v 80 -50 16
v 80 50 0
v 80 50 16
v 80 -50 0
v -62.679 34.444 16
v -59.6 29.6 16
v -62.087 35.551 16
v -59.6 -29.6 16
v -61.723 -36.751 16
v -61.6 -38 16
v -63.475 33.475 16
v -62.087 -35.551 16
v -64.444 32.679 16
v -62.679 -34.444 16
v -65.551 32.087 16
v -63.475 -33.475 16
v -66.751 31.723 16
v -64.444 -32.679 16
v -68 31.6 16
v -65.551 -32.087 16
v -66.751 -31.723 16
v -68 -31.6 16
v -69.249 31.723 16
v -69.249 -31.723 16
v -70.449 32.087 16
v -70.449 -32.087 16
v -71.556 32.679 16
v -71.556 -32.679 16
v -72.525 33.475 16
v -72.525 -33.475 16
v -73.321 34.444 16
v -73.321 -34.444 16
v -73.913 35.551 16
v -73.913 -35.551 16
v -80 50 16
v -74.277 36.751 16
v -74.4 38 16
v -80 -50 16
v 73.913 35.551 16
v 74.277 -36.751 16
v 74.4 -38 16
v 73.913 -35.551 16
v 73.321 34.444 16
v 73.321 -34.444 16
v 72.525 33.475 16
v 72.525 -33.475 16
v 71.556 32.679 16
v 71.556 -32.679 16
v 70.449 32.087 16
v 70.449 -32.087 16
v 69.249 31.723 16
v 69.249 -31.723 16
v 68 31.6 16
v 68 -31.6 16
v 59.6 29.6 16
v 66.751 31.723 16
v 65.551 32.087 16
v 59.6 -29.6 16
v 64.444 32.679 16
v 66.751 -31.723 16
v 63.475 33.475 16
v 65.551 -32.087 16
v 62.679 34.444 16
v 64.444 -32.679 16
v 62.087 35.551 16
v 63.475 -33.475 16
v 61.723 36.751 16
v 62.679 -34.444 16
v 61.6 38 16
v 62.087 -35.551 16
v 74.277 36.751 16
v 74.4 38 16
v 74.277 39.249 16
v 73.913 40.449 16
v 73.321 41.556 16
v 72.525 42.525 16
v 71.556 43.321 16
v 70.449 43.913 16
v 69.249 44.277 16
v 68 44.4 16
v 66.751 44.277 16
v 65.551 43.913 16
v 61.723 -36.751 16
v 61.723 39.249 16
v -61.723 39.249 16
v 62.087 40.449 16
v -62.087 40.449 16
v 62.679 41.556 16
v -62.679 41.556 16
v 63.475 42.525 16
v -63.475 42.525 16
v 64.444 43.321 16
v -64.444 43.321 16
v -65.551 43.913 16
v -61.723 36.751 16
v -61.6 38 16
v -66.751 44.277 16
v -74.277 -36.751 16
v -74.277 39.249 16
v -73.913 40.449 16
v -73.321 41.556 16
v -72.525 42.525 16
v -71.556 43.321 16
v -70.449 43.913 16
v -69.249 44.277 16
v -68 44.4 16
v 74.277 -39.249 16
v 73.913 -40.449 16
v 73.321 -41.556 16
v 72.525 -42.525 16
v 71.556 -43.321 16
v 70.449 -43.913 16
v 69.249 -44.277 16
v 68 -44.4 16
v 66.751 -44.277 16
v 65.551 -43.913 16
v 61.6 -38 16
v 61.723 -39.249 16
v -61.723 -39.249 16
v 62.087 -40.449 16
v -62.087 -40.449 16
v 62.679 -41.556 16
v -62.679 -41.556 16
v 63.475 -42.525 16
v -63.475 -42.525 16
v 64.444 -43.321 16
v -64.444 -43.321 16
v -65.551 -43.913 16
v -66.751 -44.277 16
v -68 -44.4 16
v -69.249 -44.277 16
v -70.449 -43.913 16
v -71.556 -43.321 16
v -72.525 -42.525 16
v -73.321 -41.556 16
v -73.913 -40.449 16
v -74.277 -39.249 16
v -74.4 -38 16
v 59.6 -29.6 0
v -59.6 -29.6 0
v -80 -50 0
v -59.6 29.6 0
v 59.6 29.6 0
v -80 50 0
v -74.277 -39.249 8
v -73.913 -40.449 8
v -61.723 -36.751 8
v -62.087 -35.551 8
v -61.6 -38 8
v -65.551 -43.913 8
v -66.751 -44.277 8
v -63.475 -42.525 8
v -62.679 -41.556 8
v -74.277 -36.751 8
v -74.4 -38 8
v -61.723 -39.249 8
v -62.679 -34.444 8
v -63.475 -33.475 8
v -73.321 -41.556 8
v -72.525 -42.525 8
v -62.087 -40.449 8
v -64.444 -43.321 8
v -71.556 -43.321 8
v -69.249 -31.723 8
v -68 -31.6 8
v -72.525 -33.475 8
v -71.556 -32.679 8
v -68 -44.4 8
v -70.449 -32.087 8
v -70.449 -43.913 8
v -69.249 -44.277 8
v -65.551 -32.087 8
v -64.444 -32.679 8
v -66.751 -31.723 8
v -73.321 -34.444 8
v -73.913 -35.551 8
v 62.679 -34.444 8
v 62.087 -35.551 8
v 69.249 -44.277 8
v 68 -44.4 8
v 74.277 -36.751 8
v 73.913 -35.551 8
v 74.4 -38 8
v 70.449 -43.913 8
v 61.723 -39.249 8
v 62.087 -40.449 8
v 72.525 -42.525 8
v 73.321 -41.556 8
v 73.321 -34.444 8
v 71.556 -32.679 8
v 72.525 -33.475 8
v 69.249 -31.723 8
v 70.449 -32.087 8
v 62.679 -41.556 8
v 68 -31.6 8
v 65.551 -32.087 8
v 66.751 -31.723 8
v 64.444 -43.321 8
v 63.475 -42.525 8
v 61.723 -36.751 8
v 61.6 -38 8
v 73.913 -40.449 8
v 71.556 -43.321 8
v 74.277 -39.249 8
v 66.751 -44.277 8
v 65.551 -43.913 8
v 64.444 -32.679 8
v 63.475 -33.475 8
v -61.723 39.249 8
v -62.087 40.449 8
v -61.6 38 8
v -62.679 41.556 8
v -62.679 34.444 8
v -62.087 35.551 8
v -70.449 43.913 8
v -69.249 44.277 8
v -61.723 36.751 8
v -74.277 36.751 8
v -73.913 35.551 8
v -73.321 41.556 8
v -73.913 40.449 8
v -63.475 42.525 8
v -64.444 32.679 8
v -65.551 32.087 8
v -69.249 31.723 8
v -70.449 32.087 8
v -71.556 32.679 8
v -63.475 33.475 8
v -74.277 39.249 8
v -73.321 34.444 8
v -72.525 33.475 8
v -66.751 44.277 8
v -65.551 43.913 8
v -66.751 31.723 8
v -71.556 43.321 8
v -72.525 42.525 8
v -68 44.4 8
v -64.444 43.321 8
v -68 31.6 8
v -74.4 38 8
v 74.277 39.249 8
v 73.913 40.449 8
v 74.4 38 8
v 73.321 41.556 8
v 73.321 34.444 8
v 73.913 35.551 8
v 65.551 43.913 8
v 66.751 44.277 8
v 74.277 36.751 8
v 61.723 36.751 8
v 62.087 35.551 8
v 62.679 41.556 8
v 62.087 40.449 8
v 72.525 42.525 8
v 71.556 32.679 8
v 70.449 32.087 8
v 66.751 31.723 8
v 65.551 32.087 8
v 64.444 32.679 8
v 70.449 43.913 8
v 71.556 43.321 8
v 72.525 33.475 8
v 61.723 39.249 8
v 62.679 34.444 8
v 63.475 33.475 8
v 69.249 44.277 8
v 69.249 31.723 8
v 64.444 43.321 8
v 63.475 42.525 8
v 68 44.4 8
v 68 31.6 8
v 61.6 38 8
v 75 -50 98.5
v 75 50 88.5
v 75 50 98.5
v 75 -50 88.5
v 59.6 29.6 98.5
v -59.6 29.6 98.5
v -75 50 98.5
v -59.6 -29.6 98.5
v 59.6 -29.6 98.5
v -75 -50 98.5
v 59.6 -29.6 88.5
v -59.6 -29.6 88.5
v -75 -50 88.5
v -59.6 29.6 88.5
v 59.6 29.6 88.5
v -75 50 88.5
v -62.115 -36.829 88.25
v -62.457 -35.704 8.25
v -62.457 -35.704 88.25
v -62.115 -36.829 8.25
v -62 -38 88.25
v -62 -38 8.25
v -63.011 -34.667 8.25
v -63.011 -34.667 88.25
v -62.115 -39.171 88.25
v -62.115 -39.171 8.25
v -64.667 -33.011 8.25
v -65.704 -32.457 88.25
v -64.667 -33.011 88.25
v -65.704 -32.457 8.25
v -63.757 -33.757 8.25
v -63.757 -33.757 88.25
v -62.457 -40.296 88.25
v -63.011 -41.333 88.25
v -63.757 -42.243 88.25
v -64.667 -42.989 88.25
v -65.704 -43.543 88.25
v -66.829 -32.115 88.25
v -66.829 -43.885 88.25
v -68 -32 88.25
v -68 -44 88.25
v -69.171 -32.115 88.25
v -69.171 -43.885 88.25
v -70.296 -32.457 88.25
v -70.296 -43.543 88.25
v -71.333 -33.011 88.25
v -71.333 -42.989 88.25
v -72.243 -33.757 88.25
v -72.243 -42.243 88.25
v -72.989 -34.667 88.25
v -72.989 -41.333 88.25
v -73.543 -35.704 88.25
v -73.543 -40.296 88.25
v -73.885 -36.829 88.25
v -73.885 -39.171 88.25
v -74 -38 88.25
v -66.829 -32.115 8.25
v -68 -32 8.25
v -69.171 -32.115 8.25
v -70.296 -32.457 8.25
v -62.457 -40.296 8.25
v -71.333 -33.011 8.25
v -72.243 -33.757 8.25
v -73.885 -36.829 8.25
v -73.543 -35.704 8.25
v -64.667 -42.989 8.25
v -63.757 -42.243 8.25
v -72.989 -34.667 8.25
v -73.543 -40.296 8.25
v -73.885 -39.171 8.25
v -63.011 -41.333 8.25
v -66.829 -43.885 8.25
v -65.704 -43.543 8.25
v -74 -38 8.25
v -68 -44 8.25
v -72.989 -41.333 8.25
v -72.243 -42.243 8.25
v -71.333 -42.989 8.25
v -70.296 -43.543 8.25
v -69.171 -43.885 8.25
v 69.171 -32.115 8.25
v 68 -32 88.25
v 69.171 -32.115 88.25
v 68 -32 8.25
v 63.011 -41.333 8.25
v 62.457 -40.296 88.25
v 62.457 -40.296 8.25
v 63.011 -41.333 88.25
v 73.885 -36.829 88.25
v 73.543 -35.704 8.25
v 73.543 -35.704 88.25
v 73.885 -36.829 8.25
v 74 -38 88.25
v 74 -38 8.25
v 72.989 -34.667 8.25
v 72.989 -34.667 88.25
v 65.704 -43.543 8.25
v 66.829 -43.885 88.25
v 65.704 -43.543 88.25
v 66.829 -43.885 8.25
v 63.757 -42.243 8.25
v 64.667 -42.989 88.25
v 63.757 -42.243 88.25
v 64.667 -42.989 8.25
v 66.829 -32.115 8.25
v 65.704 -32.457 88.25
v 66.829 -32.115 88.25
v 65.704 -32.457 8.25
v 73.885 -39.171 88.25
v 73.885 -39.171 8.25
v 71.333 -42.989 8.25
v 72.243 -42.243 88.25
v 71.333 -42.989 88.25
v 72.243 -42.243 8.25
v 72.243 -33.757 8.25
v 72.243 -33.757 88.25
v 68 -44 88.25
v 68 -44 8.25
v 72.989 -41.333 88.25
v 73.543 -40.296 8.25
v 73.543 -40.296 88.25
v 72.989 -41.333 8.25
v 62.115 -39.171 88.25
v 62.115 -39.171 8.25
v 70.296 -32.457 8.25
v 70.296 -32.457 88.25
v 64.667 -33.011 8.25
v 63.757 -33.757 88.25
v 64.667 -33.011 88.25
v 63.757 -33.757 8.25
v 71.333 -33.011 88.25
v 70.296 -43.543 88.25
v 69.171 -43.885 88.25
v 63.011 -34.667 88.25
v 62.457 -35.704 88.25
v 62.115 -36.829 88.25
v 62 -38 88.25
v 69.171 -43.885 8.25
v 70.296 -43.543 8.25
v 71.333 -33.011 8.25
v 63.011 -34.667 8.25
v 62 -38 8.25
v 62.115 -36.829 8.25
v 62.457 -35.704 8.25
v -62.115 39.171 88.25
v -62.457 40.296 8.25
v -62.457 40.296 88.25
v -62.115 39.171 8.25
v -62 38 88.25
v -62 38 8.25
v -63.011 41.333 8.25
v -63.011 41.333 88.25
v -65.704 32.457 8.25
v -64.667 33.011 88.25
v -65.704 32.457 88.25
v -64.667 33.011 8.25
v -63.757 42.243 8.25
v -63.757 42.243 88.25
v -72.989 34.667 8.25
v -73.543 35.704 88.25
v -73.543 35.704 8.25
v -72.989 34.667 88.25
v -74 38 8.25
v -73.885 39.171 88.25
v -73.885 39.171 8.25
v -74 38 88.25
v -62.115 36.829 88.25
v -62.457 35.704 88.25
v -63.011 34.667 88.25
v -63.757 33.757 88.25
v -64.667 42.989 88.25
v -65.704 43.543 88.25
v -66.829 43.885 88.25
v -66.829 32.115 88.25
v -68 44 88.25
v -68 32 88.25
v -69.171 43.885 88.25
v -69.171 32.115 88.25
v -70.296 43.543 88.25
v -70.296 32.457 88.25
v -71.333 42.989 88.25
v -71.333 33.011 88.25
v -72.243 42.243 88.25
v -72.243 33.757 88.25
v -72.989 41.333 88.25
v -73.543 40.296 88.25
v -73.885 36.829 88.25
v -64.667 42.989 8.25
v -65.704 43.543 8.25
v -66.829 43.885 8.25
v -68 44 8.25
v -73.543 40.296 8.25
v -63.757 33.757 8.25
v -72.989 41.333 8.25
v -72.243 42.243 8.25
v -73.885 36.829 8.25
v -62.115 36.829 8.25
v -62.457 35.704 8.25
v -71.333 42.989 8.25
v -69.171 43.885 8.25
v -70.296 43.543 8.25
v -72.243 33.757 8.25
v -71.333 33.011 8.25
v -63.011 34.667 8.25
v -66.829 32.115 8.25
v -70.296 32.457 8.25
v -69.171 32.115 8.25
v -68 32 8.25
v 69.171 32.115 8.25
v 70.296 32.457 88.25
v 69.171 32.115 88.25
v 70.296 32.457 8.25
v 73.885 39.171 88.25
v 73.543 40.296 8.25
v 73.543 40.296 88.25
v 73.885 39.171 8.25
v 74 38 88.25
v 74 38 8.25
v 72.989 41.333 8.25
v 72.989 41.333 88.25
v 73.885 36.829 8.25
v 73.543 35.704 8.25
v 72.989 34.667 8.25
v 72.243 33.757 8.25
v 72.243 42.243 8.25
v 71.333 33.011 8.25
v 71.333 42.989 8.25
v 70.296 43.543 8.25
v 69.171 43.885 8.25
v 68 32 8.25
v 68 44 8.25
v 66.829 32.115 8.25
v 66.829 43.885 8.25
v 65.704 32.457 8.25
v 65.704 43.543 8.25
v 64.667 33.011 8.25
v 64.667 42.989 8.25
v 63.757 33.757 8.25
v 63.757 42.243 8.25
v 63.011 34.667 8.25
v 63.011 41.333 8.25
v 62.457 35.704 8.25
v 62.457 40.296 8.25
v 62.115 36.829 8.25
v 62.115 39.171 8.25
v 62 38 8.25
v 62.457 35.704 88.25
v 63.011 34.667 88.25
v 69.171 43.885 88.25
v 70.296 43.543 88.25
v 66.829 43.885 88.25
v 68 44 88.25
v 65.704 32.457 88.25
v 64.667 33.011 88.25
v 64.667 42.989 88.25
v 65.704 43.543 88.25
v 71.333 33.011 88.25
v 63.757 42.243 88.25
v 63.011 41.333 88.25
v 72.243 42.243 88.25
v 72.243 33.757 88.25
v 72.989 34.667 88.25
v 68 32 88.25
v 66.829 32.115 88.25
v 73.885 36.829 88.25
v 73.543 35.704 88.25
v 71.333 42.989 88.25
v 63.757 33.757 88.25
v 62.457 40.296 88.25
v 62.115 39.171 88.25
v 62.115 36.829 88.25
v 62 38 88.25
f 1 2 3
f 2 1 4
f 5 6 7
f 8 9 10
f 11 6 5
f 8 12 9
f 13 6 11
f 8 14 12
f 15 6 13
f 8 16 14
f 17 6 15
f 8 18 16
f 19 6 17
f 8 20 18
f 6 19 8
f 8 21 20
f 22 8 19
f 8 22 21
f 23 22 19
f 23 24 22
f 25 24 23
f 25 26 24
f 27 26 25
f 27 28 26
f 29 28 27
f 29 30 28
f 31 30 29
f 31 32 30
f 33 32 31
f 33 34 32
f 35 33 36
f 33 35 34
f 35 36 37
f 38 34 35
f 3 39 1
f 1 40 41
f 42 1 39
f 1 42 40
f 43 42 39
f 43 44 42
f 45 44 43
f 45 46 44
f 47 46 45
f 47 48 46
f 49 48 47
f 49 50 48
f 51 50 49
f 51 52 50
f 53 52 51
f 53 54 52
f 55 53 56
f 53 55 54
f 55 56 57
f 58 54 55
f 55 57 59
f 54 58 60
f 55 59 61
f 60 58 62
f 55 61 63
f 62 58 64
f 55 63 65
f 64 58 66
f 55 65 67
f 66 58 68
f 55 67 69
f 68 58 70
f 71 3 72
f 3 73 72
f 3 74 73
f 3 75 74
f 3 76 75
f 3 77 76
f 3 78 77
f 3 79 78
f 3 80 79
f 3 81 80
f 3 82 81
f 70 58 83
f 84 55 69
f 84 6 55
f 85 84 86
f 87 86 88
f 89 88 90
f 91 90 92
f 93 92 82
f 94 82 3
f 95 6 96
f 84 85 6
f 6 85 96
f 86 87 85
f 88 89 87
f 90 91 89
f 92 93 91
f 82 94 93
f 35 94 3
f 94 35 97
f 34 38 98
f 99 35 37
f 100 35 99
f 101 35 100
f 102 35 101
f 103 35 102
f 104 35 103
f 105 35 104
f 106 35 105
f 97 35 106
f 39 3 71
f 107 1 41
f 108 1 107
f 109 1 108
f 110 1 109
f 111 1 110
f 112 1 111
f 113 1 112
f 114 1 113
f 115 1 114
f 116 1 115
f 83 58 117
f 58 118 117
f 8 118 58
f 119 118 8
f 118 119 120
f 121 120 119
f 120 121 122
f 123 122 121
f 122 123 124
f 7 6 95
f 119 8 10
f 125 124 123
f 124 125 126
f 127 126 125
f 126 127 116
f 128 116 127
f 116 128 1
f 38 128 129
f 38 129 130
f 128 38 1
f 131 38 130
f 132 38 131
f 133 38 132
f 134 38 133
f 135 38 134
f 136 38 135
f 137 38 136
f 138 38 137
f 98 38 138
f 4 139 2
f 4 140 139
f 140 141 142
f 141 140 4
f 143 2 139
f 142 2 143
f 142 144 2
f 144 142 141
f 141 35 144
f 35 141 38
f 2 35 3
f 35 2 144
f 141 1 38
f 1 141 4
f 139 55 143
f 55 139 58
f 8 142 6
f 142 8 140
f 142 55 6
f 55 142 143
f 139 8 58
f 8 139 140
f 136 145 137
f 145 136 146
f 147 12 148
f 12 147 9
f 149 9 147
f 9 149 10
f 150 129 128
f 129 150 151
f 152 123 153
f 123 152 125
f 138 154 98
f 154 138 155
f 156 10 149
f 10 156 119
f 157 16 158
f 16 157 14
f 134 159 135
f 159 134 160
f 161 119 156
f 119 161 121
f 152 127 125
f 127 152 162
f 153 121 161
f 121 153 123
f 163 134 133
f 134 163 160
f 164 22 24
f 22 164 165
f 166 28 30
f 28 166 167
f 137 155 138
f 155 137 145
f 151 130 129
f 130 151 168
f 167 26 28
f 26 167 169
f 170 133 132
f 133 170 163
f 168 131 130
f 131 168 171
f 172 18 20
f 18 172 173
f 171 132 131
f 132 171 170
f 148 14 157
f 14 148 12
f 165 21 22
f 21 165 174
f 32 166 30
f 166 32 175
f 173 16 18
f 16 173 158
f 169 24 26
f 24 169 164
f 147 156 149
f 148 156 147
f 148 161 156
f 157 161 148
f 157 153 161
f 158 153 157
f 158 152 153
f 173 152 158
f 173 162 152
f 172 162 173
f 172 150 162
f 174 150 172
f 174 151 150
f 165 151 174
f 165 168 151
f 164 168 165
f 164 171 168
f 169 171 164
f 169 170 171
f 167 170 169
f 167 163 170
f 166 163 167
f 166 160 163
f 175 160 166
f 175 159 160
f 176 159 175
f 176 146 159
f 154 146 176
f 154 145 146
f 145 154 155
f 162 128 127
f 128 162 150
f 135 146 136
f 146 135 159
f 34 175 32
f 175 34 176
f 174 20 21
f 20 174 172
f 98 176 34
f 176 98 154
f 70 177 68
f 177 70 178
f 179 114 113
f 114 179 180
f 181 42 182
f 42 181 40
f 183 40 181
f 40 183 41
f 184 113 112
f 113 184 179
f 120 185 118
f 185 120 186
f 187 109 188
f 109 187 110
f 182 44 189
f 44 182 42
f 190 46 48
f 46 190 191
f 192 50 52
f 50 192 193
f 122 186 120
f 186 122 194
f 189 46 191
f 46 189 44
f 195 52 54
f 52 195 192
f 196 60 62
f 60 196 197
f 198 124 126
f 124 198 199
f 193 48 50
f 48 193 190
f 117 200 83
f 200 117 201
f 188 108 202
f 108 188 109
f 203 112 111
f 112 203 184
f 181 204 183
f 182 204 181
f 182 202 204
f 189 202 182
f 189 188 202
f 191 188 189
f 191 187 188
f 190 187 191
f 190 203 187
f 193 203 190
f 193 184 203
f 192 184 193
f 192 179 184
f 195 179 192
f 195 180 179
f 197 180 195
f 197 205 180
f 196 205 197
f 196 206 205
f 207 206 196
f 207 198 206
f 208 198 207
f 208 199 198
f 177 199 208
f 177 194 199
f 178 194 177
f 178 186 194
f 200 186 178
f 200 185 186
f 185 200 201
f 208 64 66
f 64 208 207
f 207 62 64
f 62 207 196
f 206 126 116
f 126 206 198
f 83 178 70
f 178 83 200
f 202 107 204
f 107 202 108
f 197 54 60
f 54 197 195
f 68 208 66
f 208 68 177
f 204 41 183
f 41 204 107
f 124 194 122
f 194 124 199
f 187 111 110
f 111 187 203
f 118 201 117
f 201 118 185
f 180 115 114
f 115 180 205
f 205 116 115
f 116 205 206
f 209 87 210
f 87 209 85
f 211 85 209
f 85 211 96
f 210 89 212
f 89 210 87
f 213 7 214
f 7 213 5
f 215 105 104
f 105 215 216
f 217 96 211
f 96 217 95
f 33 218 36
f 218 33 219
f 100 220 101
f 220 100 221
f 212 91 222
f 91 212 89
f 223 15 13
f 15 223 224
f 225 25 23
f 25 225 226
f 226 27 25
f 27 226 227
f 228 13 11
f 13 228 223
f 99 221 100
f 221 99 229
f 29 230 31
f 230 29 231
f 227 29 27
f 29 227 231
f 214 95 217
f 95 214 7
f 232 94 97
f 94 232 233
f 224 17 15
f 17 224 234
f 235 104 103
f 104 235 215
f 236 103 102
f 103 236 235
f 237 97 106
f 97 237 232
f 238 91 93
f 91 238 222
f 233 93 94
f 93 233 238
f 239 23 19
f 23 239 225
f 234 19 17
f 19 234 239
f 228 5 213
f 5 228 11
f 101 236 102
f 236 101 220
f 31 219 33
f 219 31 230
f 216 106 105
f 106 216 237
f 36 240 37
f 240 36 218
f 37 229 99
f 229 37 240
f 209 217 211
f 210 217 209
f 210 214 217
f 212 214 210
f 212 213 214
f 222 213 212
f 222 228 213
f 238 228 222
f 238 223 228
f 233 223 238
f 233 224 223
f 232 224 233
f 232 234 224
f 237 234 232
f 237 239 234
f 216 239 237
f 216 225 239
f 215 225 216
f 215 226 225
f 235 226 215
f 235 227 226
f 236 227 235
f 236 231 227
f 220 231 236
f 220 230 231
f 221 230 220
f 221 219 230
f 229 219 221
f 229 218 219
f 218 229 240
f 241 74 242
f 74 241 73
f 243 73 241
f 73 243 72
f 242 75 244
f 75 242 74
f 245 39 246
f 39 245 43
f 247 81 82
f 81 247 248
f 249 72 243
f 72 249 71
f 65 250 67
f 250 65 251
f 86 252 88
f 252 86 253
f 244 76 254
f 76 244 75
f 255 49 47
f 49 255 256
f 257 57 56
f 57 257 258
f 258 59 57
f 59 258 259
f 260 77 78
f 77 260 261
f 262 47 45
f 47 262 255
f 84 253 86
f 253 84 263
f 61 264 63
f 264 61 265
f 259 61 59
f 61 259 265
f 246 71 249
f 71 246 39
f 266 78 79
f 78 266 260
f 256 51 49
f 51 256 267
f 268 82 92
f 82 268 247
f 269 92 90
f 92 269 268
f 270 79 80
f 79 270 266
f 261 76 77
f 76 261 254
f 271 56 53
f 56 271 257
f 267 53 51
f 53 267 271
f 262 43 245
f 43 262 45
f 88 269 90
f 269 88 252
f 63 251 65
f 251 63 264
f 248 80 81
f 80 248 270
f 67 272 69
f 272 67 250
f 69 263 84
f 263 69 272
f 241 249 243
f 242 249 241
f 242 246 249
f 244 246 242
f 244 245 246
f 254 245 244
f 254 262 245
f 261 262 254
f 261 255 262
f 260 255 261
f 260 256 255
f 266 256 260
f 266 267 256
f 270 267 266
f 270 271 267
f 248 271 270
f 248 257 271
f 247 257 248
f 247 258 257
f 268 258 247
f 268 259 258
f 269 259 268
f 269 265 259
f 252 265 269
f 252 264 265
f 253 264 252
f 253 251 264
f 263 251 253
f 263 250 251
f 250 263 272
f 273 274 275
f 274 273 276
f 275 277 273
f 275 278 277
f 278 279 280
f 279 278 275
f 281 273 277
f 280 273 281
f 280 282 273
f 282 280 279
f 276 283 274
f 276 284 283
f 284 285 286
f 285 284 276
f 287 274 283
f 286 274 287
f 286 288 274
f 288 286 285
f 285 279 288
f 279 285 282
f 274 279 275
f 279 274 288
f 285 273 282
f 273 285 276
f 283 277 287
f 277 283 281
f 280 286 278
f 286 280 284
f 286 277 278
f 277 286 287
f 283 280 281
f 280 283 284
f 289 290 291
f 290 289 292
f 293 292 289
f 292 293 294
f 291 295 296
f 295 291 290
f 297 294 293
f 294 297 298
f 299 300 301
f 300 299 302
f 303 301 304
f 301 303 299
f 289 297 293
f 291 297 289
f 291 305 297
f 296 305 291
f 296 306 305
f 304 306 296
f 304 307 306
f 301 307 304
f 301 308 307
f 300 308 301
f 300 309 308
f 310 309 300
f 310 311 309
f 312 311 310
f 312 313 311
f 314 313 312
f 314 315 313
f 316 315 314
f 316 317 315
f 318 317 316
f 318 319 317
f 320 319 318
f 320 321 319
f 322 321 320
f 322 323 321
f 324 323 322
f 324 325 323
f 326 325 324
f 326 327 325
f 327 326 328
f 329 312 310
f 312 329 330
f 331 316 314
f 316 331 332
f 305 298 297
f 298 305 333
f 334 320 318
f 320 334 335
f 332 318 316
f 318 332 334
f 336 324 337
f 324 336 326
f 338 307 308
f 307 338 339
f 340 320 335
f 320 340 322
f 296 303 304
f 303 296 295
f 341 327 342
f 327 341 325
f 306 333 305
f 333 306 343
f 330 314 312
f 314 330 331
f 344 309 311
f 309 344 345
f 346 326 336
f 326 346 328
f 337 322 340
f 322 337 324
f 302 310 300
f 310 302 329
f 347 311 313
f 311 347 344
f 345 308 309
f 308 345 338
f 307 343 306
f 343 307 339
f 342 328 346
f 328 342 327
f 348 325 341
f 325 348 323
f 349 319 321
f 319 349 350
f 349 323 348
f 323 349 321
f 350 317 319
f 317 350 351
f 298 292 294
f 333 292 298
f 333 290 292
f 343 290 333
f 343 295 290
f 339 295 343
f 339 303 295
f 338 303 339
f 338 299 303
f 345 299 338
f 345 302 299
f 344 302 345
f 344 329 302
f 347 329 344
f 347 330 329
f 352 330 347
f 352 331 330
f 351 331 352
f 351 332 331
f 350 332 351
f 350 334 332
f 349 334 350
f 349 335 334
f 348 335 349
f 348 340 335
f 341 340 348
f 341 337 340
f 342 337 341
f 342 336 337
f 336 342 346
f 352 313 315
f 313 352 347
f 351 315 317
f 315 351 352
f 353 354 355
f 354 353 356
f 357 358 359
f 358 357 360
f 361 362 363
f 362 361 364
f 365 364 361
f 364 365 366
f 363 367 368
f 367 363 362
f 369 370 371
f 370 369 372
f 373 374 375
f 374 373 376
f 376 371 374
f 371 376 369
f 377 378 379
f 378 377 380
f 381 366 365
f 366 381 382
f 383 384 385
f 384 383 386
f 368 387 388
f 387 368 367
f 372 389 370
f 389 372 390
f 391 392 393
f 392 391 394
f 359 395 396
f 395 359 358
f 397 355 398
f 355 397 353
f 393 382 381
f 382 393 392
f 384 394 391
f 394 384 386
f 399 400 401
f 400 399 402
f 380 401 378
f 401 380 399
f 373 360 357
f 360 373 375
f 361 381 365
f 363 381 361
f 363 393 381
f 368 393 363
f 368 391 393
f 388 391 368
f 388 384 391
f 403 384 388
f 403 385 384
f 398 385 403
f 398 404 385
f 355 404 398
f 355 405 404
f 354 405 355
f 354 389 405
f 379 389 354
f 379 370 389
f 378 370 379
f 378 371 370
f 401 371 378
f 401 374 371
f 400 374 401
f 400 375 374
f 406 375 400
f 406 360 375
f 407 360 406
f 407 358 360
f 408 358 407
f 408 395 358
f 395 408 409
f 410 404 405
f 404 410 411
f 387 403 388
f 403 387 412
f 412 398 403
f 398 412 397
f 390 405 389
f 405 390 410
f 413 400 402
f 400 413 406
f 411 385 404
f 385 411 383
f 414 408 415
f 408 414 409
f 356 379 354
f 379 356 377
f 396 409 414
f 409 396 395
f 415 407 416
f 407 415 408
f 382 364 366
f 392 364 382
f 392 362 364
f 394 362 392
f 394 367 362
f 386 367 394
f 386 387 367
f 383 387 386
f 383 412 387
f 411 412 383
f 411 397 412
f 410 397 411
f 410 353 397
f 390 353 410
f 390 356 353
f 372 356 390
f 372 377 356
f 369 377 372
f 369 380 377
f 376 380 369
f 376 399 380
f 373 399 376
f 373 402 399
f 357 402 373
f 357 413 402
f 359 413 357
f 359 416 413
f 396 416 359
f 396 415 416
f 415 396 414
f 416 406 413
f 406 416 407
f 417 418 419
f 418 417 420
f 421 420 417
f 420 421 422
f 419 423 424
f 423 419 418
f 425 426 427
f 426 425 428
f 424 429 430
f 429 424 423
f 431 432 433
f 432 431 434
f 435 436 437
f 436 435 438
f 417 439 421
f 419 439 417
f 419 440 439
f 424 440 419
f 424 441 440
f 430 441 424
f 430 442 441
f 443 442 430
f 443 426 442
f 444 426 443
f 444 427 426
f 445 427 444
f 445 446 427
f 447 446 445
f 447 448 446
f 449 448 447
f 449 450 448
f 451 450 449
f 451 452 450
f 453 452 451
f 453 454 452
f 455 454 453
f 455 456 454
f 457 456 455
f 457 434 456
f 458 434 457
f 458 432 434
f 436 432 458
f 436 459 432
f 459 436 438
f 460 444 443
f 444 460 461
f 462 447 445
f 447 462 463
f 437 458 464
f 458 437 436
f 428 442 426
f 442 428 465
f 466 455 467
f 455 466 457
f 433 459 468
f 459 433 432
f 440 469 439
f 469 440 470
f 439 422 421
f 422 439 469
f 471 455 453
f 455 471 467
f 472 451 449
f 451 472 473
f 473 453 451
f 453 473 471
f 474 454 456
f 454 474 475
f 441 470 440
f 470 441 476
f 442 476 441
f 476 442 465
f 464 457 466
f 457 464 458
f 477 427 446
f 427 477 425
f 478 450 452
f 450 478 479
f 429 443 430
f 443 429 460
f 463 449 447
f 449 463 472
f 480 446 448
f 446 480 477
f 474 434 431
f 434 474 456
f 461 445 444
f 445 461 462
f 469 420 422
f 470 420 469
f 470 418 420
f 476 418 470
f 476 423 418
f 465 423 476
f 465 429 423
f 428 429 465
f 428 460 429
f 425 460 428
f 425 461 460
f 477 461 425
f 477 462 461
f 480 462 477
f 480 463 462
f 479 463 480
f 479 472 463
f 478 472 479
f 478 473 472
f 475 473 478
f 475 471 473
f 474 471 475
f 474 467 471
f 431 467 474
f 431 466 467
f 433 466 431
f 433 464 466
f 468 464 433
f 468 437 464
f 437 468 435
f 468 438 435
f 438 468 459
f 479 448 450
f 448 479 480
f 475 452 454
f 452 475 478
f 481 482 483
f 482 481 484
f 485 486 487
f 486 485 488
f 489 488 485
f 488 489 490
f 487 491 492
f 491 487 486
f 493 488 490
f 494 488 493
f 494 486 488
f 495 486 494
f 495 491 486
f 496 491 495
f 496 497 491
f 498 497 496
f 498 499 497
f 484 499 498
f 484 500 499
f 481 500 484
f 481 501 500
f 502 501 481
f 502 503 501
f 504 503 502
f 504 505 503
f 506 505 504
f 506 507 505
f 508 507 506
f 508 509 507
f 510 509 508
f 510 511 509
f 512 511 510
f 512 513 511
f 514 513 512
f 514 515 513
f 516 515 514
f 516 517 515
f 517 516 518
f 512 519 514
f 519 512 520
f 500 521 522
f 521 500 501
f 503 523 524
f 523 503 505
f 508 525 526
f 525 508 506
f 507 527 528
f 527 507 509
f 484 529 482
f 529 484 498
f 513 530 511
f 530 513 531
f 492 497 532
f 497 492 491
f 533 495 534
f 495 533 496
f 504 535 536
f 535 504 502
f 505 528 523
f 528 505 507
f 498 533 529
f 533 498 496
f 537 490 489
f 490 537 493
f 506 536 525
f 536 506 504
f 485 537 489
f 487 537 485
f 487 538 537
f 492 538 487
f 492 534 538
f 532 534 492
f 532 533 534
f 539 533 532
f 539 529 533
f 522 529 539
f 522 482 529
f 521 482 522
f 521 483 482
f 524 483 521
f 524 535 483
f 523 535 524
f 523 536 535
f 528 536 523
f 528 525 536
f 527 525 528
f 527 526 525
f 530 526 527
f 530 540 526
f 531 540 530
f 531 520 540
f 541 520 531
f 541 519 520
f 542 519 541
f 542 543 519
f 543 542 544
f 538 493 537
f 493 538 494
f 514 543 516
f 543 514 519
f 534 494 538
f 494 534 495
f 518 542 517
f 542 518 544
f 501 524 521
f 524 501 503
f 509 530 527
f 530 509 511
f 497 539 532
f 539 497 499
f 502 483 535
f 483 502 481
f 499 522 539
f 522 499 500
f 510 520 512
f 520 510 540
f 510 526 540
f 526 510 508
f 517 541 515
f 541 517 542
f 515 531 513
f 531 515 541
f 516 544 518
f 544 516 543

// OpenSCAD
$fn = 32;

// ------------------------------------------------------------------------
// Frame cube: base 160 x 100 mm, posts 80 mm tall
// Every part is its own module, assembly() places every instance.
// ------------------------------------------------------------------------

// --- part 1 ---
module base_frame() {
  difference() {
    translate([-80, -50, 0]) cube([160, 100, 16]);
    translate([-59.6, -29.6, -1]) cube([119.2, 59.2, 18]);
    translate([-68, -38, 8]) cylinder(h = 9, d = 12.8);
    translate([68, -38, 8]) cylinder(h = 9, d = 12.8);
    translate([-68, 38, 8]) cylinder(h = 9, d = 12.8);
    translate([68, 38, 8]) cylinder(h = 9, d = 12.8);
  }
}

// --- part 2 ---
module corner_post() {
  cylinder(h = 80, d = 12);
}

// --- part 3 ---
module top_frame() {
  difference() {
    translate([-75, -50, 0]) cube([150, 100, 10]);
    translate([-59.6, -29.6, -1]) cube([119.2, 59.2, 12]);
  }
}

// --- assembly ---
module assembly() {
  color([0.80, 0.24, 0.20]) translate([0, 0, 0]) rotate([0, 0, 0]) base_frame();
  color([0.20, 0.45, 0.75]) translate([-68, -38, 8.25]) rotate([0, 0, 0]) corner_post();
  color([0.25, 0.62, 0.32]) translate([68, -38, 8.25]) rotate([0, 0, 0]) corner_post();
  color([0.92, 0.70, 0.18]) translate([-68, 38, 8.25]) rotate([0, 0, 0]) corner_post();
  color([0.58, 0.35, 0.70]) translate([68, 38, 8.25]) rotate([0, 0, 0]) corner_post();
  color([0.16, 0.66, 0.66]) translate([0, 0, 88.5]) rotate([0, 0, 0]) top_frame();
}

assembly();
